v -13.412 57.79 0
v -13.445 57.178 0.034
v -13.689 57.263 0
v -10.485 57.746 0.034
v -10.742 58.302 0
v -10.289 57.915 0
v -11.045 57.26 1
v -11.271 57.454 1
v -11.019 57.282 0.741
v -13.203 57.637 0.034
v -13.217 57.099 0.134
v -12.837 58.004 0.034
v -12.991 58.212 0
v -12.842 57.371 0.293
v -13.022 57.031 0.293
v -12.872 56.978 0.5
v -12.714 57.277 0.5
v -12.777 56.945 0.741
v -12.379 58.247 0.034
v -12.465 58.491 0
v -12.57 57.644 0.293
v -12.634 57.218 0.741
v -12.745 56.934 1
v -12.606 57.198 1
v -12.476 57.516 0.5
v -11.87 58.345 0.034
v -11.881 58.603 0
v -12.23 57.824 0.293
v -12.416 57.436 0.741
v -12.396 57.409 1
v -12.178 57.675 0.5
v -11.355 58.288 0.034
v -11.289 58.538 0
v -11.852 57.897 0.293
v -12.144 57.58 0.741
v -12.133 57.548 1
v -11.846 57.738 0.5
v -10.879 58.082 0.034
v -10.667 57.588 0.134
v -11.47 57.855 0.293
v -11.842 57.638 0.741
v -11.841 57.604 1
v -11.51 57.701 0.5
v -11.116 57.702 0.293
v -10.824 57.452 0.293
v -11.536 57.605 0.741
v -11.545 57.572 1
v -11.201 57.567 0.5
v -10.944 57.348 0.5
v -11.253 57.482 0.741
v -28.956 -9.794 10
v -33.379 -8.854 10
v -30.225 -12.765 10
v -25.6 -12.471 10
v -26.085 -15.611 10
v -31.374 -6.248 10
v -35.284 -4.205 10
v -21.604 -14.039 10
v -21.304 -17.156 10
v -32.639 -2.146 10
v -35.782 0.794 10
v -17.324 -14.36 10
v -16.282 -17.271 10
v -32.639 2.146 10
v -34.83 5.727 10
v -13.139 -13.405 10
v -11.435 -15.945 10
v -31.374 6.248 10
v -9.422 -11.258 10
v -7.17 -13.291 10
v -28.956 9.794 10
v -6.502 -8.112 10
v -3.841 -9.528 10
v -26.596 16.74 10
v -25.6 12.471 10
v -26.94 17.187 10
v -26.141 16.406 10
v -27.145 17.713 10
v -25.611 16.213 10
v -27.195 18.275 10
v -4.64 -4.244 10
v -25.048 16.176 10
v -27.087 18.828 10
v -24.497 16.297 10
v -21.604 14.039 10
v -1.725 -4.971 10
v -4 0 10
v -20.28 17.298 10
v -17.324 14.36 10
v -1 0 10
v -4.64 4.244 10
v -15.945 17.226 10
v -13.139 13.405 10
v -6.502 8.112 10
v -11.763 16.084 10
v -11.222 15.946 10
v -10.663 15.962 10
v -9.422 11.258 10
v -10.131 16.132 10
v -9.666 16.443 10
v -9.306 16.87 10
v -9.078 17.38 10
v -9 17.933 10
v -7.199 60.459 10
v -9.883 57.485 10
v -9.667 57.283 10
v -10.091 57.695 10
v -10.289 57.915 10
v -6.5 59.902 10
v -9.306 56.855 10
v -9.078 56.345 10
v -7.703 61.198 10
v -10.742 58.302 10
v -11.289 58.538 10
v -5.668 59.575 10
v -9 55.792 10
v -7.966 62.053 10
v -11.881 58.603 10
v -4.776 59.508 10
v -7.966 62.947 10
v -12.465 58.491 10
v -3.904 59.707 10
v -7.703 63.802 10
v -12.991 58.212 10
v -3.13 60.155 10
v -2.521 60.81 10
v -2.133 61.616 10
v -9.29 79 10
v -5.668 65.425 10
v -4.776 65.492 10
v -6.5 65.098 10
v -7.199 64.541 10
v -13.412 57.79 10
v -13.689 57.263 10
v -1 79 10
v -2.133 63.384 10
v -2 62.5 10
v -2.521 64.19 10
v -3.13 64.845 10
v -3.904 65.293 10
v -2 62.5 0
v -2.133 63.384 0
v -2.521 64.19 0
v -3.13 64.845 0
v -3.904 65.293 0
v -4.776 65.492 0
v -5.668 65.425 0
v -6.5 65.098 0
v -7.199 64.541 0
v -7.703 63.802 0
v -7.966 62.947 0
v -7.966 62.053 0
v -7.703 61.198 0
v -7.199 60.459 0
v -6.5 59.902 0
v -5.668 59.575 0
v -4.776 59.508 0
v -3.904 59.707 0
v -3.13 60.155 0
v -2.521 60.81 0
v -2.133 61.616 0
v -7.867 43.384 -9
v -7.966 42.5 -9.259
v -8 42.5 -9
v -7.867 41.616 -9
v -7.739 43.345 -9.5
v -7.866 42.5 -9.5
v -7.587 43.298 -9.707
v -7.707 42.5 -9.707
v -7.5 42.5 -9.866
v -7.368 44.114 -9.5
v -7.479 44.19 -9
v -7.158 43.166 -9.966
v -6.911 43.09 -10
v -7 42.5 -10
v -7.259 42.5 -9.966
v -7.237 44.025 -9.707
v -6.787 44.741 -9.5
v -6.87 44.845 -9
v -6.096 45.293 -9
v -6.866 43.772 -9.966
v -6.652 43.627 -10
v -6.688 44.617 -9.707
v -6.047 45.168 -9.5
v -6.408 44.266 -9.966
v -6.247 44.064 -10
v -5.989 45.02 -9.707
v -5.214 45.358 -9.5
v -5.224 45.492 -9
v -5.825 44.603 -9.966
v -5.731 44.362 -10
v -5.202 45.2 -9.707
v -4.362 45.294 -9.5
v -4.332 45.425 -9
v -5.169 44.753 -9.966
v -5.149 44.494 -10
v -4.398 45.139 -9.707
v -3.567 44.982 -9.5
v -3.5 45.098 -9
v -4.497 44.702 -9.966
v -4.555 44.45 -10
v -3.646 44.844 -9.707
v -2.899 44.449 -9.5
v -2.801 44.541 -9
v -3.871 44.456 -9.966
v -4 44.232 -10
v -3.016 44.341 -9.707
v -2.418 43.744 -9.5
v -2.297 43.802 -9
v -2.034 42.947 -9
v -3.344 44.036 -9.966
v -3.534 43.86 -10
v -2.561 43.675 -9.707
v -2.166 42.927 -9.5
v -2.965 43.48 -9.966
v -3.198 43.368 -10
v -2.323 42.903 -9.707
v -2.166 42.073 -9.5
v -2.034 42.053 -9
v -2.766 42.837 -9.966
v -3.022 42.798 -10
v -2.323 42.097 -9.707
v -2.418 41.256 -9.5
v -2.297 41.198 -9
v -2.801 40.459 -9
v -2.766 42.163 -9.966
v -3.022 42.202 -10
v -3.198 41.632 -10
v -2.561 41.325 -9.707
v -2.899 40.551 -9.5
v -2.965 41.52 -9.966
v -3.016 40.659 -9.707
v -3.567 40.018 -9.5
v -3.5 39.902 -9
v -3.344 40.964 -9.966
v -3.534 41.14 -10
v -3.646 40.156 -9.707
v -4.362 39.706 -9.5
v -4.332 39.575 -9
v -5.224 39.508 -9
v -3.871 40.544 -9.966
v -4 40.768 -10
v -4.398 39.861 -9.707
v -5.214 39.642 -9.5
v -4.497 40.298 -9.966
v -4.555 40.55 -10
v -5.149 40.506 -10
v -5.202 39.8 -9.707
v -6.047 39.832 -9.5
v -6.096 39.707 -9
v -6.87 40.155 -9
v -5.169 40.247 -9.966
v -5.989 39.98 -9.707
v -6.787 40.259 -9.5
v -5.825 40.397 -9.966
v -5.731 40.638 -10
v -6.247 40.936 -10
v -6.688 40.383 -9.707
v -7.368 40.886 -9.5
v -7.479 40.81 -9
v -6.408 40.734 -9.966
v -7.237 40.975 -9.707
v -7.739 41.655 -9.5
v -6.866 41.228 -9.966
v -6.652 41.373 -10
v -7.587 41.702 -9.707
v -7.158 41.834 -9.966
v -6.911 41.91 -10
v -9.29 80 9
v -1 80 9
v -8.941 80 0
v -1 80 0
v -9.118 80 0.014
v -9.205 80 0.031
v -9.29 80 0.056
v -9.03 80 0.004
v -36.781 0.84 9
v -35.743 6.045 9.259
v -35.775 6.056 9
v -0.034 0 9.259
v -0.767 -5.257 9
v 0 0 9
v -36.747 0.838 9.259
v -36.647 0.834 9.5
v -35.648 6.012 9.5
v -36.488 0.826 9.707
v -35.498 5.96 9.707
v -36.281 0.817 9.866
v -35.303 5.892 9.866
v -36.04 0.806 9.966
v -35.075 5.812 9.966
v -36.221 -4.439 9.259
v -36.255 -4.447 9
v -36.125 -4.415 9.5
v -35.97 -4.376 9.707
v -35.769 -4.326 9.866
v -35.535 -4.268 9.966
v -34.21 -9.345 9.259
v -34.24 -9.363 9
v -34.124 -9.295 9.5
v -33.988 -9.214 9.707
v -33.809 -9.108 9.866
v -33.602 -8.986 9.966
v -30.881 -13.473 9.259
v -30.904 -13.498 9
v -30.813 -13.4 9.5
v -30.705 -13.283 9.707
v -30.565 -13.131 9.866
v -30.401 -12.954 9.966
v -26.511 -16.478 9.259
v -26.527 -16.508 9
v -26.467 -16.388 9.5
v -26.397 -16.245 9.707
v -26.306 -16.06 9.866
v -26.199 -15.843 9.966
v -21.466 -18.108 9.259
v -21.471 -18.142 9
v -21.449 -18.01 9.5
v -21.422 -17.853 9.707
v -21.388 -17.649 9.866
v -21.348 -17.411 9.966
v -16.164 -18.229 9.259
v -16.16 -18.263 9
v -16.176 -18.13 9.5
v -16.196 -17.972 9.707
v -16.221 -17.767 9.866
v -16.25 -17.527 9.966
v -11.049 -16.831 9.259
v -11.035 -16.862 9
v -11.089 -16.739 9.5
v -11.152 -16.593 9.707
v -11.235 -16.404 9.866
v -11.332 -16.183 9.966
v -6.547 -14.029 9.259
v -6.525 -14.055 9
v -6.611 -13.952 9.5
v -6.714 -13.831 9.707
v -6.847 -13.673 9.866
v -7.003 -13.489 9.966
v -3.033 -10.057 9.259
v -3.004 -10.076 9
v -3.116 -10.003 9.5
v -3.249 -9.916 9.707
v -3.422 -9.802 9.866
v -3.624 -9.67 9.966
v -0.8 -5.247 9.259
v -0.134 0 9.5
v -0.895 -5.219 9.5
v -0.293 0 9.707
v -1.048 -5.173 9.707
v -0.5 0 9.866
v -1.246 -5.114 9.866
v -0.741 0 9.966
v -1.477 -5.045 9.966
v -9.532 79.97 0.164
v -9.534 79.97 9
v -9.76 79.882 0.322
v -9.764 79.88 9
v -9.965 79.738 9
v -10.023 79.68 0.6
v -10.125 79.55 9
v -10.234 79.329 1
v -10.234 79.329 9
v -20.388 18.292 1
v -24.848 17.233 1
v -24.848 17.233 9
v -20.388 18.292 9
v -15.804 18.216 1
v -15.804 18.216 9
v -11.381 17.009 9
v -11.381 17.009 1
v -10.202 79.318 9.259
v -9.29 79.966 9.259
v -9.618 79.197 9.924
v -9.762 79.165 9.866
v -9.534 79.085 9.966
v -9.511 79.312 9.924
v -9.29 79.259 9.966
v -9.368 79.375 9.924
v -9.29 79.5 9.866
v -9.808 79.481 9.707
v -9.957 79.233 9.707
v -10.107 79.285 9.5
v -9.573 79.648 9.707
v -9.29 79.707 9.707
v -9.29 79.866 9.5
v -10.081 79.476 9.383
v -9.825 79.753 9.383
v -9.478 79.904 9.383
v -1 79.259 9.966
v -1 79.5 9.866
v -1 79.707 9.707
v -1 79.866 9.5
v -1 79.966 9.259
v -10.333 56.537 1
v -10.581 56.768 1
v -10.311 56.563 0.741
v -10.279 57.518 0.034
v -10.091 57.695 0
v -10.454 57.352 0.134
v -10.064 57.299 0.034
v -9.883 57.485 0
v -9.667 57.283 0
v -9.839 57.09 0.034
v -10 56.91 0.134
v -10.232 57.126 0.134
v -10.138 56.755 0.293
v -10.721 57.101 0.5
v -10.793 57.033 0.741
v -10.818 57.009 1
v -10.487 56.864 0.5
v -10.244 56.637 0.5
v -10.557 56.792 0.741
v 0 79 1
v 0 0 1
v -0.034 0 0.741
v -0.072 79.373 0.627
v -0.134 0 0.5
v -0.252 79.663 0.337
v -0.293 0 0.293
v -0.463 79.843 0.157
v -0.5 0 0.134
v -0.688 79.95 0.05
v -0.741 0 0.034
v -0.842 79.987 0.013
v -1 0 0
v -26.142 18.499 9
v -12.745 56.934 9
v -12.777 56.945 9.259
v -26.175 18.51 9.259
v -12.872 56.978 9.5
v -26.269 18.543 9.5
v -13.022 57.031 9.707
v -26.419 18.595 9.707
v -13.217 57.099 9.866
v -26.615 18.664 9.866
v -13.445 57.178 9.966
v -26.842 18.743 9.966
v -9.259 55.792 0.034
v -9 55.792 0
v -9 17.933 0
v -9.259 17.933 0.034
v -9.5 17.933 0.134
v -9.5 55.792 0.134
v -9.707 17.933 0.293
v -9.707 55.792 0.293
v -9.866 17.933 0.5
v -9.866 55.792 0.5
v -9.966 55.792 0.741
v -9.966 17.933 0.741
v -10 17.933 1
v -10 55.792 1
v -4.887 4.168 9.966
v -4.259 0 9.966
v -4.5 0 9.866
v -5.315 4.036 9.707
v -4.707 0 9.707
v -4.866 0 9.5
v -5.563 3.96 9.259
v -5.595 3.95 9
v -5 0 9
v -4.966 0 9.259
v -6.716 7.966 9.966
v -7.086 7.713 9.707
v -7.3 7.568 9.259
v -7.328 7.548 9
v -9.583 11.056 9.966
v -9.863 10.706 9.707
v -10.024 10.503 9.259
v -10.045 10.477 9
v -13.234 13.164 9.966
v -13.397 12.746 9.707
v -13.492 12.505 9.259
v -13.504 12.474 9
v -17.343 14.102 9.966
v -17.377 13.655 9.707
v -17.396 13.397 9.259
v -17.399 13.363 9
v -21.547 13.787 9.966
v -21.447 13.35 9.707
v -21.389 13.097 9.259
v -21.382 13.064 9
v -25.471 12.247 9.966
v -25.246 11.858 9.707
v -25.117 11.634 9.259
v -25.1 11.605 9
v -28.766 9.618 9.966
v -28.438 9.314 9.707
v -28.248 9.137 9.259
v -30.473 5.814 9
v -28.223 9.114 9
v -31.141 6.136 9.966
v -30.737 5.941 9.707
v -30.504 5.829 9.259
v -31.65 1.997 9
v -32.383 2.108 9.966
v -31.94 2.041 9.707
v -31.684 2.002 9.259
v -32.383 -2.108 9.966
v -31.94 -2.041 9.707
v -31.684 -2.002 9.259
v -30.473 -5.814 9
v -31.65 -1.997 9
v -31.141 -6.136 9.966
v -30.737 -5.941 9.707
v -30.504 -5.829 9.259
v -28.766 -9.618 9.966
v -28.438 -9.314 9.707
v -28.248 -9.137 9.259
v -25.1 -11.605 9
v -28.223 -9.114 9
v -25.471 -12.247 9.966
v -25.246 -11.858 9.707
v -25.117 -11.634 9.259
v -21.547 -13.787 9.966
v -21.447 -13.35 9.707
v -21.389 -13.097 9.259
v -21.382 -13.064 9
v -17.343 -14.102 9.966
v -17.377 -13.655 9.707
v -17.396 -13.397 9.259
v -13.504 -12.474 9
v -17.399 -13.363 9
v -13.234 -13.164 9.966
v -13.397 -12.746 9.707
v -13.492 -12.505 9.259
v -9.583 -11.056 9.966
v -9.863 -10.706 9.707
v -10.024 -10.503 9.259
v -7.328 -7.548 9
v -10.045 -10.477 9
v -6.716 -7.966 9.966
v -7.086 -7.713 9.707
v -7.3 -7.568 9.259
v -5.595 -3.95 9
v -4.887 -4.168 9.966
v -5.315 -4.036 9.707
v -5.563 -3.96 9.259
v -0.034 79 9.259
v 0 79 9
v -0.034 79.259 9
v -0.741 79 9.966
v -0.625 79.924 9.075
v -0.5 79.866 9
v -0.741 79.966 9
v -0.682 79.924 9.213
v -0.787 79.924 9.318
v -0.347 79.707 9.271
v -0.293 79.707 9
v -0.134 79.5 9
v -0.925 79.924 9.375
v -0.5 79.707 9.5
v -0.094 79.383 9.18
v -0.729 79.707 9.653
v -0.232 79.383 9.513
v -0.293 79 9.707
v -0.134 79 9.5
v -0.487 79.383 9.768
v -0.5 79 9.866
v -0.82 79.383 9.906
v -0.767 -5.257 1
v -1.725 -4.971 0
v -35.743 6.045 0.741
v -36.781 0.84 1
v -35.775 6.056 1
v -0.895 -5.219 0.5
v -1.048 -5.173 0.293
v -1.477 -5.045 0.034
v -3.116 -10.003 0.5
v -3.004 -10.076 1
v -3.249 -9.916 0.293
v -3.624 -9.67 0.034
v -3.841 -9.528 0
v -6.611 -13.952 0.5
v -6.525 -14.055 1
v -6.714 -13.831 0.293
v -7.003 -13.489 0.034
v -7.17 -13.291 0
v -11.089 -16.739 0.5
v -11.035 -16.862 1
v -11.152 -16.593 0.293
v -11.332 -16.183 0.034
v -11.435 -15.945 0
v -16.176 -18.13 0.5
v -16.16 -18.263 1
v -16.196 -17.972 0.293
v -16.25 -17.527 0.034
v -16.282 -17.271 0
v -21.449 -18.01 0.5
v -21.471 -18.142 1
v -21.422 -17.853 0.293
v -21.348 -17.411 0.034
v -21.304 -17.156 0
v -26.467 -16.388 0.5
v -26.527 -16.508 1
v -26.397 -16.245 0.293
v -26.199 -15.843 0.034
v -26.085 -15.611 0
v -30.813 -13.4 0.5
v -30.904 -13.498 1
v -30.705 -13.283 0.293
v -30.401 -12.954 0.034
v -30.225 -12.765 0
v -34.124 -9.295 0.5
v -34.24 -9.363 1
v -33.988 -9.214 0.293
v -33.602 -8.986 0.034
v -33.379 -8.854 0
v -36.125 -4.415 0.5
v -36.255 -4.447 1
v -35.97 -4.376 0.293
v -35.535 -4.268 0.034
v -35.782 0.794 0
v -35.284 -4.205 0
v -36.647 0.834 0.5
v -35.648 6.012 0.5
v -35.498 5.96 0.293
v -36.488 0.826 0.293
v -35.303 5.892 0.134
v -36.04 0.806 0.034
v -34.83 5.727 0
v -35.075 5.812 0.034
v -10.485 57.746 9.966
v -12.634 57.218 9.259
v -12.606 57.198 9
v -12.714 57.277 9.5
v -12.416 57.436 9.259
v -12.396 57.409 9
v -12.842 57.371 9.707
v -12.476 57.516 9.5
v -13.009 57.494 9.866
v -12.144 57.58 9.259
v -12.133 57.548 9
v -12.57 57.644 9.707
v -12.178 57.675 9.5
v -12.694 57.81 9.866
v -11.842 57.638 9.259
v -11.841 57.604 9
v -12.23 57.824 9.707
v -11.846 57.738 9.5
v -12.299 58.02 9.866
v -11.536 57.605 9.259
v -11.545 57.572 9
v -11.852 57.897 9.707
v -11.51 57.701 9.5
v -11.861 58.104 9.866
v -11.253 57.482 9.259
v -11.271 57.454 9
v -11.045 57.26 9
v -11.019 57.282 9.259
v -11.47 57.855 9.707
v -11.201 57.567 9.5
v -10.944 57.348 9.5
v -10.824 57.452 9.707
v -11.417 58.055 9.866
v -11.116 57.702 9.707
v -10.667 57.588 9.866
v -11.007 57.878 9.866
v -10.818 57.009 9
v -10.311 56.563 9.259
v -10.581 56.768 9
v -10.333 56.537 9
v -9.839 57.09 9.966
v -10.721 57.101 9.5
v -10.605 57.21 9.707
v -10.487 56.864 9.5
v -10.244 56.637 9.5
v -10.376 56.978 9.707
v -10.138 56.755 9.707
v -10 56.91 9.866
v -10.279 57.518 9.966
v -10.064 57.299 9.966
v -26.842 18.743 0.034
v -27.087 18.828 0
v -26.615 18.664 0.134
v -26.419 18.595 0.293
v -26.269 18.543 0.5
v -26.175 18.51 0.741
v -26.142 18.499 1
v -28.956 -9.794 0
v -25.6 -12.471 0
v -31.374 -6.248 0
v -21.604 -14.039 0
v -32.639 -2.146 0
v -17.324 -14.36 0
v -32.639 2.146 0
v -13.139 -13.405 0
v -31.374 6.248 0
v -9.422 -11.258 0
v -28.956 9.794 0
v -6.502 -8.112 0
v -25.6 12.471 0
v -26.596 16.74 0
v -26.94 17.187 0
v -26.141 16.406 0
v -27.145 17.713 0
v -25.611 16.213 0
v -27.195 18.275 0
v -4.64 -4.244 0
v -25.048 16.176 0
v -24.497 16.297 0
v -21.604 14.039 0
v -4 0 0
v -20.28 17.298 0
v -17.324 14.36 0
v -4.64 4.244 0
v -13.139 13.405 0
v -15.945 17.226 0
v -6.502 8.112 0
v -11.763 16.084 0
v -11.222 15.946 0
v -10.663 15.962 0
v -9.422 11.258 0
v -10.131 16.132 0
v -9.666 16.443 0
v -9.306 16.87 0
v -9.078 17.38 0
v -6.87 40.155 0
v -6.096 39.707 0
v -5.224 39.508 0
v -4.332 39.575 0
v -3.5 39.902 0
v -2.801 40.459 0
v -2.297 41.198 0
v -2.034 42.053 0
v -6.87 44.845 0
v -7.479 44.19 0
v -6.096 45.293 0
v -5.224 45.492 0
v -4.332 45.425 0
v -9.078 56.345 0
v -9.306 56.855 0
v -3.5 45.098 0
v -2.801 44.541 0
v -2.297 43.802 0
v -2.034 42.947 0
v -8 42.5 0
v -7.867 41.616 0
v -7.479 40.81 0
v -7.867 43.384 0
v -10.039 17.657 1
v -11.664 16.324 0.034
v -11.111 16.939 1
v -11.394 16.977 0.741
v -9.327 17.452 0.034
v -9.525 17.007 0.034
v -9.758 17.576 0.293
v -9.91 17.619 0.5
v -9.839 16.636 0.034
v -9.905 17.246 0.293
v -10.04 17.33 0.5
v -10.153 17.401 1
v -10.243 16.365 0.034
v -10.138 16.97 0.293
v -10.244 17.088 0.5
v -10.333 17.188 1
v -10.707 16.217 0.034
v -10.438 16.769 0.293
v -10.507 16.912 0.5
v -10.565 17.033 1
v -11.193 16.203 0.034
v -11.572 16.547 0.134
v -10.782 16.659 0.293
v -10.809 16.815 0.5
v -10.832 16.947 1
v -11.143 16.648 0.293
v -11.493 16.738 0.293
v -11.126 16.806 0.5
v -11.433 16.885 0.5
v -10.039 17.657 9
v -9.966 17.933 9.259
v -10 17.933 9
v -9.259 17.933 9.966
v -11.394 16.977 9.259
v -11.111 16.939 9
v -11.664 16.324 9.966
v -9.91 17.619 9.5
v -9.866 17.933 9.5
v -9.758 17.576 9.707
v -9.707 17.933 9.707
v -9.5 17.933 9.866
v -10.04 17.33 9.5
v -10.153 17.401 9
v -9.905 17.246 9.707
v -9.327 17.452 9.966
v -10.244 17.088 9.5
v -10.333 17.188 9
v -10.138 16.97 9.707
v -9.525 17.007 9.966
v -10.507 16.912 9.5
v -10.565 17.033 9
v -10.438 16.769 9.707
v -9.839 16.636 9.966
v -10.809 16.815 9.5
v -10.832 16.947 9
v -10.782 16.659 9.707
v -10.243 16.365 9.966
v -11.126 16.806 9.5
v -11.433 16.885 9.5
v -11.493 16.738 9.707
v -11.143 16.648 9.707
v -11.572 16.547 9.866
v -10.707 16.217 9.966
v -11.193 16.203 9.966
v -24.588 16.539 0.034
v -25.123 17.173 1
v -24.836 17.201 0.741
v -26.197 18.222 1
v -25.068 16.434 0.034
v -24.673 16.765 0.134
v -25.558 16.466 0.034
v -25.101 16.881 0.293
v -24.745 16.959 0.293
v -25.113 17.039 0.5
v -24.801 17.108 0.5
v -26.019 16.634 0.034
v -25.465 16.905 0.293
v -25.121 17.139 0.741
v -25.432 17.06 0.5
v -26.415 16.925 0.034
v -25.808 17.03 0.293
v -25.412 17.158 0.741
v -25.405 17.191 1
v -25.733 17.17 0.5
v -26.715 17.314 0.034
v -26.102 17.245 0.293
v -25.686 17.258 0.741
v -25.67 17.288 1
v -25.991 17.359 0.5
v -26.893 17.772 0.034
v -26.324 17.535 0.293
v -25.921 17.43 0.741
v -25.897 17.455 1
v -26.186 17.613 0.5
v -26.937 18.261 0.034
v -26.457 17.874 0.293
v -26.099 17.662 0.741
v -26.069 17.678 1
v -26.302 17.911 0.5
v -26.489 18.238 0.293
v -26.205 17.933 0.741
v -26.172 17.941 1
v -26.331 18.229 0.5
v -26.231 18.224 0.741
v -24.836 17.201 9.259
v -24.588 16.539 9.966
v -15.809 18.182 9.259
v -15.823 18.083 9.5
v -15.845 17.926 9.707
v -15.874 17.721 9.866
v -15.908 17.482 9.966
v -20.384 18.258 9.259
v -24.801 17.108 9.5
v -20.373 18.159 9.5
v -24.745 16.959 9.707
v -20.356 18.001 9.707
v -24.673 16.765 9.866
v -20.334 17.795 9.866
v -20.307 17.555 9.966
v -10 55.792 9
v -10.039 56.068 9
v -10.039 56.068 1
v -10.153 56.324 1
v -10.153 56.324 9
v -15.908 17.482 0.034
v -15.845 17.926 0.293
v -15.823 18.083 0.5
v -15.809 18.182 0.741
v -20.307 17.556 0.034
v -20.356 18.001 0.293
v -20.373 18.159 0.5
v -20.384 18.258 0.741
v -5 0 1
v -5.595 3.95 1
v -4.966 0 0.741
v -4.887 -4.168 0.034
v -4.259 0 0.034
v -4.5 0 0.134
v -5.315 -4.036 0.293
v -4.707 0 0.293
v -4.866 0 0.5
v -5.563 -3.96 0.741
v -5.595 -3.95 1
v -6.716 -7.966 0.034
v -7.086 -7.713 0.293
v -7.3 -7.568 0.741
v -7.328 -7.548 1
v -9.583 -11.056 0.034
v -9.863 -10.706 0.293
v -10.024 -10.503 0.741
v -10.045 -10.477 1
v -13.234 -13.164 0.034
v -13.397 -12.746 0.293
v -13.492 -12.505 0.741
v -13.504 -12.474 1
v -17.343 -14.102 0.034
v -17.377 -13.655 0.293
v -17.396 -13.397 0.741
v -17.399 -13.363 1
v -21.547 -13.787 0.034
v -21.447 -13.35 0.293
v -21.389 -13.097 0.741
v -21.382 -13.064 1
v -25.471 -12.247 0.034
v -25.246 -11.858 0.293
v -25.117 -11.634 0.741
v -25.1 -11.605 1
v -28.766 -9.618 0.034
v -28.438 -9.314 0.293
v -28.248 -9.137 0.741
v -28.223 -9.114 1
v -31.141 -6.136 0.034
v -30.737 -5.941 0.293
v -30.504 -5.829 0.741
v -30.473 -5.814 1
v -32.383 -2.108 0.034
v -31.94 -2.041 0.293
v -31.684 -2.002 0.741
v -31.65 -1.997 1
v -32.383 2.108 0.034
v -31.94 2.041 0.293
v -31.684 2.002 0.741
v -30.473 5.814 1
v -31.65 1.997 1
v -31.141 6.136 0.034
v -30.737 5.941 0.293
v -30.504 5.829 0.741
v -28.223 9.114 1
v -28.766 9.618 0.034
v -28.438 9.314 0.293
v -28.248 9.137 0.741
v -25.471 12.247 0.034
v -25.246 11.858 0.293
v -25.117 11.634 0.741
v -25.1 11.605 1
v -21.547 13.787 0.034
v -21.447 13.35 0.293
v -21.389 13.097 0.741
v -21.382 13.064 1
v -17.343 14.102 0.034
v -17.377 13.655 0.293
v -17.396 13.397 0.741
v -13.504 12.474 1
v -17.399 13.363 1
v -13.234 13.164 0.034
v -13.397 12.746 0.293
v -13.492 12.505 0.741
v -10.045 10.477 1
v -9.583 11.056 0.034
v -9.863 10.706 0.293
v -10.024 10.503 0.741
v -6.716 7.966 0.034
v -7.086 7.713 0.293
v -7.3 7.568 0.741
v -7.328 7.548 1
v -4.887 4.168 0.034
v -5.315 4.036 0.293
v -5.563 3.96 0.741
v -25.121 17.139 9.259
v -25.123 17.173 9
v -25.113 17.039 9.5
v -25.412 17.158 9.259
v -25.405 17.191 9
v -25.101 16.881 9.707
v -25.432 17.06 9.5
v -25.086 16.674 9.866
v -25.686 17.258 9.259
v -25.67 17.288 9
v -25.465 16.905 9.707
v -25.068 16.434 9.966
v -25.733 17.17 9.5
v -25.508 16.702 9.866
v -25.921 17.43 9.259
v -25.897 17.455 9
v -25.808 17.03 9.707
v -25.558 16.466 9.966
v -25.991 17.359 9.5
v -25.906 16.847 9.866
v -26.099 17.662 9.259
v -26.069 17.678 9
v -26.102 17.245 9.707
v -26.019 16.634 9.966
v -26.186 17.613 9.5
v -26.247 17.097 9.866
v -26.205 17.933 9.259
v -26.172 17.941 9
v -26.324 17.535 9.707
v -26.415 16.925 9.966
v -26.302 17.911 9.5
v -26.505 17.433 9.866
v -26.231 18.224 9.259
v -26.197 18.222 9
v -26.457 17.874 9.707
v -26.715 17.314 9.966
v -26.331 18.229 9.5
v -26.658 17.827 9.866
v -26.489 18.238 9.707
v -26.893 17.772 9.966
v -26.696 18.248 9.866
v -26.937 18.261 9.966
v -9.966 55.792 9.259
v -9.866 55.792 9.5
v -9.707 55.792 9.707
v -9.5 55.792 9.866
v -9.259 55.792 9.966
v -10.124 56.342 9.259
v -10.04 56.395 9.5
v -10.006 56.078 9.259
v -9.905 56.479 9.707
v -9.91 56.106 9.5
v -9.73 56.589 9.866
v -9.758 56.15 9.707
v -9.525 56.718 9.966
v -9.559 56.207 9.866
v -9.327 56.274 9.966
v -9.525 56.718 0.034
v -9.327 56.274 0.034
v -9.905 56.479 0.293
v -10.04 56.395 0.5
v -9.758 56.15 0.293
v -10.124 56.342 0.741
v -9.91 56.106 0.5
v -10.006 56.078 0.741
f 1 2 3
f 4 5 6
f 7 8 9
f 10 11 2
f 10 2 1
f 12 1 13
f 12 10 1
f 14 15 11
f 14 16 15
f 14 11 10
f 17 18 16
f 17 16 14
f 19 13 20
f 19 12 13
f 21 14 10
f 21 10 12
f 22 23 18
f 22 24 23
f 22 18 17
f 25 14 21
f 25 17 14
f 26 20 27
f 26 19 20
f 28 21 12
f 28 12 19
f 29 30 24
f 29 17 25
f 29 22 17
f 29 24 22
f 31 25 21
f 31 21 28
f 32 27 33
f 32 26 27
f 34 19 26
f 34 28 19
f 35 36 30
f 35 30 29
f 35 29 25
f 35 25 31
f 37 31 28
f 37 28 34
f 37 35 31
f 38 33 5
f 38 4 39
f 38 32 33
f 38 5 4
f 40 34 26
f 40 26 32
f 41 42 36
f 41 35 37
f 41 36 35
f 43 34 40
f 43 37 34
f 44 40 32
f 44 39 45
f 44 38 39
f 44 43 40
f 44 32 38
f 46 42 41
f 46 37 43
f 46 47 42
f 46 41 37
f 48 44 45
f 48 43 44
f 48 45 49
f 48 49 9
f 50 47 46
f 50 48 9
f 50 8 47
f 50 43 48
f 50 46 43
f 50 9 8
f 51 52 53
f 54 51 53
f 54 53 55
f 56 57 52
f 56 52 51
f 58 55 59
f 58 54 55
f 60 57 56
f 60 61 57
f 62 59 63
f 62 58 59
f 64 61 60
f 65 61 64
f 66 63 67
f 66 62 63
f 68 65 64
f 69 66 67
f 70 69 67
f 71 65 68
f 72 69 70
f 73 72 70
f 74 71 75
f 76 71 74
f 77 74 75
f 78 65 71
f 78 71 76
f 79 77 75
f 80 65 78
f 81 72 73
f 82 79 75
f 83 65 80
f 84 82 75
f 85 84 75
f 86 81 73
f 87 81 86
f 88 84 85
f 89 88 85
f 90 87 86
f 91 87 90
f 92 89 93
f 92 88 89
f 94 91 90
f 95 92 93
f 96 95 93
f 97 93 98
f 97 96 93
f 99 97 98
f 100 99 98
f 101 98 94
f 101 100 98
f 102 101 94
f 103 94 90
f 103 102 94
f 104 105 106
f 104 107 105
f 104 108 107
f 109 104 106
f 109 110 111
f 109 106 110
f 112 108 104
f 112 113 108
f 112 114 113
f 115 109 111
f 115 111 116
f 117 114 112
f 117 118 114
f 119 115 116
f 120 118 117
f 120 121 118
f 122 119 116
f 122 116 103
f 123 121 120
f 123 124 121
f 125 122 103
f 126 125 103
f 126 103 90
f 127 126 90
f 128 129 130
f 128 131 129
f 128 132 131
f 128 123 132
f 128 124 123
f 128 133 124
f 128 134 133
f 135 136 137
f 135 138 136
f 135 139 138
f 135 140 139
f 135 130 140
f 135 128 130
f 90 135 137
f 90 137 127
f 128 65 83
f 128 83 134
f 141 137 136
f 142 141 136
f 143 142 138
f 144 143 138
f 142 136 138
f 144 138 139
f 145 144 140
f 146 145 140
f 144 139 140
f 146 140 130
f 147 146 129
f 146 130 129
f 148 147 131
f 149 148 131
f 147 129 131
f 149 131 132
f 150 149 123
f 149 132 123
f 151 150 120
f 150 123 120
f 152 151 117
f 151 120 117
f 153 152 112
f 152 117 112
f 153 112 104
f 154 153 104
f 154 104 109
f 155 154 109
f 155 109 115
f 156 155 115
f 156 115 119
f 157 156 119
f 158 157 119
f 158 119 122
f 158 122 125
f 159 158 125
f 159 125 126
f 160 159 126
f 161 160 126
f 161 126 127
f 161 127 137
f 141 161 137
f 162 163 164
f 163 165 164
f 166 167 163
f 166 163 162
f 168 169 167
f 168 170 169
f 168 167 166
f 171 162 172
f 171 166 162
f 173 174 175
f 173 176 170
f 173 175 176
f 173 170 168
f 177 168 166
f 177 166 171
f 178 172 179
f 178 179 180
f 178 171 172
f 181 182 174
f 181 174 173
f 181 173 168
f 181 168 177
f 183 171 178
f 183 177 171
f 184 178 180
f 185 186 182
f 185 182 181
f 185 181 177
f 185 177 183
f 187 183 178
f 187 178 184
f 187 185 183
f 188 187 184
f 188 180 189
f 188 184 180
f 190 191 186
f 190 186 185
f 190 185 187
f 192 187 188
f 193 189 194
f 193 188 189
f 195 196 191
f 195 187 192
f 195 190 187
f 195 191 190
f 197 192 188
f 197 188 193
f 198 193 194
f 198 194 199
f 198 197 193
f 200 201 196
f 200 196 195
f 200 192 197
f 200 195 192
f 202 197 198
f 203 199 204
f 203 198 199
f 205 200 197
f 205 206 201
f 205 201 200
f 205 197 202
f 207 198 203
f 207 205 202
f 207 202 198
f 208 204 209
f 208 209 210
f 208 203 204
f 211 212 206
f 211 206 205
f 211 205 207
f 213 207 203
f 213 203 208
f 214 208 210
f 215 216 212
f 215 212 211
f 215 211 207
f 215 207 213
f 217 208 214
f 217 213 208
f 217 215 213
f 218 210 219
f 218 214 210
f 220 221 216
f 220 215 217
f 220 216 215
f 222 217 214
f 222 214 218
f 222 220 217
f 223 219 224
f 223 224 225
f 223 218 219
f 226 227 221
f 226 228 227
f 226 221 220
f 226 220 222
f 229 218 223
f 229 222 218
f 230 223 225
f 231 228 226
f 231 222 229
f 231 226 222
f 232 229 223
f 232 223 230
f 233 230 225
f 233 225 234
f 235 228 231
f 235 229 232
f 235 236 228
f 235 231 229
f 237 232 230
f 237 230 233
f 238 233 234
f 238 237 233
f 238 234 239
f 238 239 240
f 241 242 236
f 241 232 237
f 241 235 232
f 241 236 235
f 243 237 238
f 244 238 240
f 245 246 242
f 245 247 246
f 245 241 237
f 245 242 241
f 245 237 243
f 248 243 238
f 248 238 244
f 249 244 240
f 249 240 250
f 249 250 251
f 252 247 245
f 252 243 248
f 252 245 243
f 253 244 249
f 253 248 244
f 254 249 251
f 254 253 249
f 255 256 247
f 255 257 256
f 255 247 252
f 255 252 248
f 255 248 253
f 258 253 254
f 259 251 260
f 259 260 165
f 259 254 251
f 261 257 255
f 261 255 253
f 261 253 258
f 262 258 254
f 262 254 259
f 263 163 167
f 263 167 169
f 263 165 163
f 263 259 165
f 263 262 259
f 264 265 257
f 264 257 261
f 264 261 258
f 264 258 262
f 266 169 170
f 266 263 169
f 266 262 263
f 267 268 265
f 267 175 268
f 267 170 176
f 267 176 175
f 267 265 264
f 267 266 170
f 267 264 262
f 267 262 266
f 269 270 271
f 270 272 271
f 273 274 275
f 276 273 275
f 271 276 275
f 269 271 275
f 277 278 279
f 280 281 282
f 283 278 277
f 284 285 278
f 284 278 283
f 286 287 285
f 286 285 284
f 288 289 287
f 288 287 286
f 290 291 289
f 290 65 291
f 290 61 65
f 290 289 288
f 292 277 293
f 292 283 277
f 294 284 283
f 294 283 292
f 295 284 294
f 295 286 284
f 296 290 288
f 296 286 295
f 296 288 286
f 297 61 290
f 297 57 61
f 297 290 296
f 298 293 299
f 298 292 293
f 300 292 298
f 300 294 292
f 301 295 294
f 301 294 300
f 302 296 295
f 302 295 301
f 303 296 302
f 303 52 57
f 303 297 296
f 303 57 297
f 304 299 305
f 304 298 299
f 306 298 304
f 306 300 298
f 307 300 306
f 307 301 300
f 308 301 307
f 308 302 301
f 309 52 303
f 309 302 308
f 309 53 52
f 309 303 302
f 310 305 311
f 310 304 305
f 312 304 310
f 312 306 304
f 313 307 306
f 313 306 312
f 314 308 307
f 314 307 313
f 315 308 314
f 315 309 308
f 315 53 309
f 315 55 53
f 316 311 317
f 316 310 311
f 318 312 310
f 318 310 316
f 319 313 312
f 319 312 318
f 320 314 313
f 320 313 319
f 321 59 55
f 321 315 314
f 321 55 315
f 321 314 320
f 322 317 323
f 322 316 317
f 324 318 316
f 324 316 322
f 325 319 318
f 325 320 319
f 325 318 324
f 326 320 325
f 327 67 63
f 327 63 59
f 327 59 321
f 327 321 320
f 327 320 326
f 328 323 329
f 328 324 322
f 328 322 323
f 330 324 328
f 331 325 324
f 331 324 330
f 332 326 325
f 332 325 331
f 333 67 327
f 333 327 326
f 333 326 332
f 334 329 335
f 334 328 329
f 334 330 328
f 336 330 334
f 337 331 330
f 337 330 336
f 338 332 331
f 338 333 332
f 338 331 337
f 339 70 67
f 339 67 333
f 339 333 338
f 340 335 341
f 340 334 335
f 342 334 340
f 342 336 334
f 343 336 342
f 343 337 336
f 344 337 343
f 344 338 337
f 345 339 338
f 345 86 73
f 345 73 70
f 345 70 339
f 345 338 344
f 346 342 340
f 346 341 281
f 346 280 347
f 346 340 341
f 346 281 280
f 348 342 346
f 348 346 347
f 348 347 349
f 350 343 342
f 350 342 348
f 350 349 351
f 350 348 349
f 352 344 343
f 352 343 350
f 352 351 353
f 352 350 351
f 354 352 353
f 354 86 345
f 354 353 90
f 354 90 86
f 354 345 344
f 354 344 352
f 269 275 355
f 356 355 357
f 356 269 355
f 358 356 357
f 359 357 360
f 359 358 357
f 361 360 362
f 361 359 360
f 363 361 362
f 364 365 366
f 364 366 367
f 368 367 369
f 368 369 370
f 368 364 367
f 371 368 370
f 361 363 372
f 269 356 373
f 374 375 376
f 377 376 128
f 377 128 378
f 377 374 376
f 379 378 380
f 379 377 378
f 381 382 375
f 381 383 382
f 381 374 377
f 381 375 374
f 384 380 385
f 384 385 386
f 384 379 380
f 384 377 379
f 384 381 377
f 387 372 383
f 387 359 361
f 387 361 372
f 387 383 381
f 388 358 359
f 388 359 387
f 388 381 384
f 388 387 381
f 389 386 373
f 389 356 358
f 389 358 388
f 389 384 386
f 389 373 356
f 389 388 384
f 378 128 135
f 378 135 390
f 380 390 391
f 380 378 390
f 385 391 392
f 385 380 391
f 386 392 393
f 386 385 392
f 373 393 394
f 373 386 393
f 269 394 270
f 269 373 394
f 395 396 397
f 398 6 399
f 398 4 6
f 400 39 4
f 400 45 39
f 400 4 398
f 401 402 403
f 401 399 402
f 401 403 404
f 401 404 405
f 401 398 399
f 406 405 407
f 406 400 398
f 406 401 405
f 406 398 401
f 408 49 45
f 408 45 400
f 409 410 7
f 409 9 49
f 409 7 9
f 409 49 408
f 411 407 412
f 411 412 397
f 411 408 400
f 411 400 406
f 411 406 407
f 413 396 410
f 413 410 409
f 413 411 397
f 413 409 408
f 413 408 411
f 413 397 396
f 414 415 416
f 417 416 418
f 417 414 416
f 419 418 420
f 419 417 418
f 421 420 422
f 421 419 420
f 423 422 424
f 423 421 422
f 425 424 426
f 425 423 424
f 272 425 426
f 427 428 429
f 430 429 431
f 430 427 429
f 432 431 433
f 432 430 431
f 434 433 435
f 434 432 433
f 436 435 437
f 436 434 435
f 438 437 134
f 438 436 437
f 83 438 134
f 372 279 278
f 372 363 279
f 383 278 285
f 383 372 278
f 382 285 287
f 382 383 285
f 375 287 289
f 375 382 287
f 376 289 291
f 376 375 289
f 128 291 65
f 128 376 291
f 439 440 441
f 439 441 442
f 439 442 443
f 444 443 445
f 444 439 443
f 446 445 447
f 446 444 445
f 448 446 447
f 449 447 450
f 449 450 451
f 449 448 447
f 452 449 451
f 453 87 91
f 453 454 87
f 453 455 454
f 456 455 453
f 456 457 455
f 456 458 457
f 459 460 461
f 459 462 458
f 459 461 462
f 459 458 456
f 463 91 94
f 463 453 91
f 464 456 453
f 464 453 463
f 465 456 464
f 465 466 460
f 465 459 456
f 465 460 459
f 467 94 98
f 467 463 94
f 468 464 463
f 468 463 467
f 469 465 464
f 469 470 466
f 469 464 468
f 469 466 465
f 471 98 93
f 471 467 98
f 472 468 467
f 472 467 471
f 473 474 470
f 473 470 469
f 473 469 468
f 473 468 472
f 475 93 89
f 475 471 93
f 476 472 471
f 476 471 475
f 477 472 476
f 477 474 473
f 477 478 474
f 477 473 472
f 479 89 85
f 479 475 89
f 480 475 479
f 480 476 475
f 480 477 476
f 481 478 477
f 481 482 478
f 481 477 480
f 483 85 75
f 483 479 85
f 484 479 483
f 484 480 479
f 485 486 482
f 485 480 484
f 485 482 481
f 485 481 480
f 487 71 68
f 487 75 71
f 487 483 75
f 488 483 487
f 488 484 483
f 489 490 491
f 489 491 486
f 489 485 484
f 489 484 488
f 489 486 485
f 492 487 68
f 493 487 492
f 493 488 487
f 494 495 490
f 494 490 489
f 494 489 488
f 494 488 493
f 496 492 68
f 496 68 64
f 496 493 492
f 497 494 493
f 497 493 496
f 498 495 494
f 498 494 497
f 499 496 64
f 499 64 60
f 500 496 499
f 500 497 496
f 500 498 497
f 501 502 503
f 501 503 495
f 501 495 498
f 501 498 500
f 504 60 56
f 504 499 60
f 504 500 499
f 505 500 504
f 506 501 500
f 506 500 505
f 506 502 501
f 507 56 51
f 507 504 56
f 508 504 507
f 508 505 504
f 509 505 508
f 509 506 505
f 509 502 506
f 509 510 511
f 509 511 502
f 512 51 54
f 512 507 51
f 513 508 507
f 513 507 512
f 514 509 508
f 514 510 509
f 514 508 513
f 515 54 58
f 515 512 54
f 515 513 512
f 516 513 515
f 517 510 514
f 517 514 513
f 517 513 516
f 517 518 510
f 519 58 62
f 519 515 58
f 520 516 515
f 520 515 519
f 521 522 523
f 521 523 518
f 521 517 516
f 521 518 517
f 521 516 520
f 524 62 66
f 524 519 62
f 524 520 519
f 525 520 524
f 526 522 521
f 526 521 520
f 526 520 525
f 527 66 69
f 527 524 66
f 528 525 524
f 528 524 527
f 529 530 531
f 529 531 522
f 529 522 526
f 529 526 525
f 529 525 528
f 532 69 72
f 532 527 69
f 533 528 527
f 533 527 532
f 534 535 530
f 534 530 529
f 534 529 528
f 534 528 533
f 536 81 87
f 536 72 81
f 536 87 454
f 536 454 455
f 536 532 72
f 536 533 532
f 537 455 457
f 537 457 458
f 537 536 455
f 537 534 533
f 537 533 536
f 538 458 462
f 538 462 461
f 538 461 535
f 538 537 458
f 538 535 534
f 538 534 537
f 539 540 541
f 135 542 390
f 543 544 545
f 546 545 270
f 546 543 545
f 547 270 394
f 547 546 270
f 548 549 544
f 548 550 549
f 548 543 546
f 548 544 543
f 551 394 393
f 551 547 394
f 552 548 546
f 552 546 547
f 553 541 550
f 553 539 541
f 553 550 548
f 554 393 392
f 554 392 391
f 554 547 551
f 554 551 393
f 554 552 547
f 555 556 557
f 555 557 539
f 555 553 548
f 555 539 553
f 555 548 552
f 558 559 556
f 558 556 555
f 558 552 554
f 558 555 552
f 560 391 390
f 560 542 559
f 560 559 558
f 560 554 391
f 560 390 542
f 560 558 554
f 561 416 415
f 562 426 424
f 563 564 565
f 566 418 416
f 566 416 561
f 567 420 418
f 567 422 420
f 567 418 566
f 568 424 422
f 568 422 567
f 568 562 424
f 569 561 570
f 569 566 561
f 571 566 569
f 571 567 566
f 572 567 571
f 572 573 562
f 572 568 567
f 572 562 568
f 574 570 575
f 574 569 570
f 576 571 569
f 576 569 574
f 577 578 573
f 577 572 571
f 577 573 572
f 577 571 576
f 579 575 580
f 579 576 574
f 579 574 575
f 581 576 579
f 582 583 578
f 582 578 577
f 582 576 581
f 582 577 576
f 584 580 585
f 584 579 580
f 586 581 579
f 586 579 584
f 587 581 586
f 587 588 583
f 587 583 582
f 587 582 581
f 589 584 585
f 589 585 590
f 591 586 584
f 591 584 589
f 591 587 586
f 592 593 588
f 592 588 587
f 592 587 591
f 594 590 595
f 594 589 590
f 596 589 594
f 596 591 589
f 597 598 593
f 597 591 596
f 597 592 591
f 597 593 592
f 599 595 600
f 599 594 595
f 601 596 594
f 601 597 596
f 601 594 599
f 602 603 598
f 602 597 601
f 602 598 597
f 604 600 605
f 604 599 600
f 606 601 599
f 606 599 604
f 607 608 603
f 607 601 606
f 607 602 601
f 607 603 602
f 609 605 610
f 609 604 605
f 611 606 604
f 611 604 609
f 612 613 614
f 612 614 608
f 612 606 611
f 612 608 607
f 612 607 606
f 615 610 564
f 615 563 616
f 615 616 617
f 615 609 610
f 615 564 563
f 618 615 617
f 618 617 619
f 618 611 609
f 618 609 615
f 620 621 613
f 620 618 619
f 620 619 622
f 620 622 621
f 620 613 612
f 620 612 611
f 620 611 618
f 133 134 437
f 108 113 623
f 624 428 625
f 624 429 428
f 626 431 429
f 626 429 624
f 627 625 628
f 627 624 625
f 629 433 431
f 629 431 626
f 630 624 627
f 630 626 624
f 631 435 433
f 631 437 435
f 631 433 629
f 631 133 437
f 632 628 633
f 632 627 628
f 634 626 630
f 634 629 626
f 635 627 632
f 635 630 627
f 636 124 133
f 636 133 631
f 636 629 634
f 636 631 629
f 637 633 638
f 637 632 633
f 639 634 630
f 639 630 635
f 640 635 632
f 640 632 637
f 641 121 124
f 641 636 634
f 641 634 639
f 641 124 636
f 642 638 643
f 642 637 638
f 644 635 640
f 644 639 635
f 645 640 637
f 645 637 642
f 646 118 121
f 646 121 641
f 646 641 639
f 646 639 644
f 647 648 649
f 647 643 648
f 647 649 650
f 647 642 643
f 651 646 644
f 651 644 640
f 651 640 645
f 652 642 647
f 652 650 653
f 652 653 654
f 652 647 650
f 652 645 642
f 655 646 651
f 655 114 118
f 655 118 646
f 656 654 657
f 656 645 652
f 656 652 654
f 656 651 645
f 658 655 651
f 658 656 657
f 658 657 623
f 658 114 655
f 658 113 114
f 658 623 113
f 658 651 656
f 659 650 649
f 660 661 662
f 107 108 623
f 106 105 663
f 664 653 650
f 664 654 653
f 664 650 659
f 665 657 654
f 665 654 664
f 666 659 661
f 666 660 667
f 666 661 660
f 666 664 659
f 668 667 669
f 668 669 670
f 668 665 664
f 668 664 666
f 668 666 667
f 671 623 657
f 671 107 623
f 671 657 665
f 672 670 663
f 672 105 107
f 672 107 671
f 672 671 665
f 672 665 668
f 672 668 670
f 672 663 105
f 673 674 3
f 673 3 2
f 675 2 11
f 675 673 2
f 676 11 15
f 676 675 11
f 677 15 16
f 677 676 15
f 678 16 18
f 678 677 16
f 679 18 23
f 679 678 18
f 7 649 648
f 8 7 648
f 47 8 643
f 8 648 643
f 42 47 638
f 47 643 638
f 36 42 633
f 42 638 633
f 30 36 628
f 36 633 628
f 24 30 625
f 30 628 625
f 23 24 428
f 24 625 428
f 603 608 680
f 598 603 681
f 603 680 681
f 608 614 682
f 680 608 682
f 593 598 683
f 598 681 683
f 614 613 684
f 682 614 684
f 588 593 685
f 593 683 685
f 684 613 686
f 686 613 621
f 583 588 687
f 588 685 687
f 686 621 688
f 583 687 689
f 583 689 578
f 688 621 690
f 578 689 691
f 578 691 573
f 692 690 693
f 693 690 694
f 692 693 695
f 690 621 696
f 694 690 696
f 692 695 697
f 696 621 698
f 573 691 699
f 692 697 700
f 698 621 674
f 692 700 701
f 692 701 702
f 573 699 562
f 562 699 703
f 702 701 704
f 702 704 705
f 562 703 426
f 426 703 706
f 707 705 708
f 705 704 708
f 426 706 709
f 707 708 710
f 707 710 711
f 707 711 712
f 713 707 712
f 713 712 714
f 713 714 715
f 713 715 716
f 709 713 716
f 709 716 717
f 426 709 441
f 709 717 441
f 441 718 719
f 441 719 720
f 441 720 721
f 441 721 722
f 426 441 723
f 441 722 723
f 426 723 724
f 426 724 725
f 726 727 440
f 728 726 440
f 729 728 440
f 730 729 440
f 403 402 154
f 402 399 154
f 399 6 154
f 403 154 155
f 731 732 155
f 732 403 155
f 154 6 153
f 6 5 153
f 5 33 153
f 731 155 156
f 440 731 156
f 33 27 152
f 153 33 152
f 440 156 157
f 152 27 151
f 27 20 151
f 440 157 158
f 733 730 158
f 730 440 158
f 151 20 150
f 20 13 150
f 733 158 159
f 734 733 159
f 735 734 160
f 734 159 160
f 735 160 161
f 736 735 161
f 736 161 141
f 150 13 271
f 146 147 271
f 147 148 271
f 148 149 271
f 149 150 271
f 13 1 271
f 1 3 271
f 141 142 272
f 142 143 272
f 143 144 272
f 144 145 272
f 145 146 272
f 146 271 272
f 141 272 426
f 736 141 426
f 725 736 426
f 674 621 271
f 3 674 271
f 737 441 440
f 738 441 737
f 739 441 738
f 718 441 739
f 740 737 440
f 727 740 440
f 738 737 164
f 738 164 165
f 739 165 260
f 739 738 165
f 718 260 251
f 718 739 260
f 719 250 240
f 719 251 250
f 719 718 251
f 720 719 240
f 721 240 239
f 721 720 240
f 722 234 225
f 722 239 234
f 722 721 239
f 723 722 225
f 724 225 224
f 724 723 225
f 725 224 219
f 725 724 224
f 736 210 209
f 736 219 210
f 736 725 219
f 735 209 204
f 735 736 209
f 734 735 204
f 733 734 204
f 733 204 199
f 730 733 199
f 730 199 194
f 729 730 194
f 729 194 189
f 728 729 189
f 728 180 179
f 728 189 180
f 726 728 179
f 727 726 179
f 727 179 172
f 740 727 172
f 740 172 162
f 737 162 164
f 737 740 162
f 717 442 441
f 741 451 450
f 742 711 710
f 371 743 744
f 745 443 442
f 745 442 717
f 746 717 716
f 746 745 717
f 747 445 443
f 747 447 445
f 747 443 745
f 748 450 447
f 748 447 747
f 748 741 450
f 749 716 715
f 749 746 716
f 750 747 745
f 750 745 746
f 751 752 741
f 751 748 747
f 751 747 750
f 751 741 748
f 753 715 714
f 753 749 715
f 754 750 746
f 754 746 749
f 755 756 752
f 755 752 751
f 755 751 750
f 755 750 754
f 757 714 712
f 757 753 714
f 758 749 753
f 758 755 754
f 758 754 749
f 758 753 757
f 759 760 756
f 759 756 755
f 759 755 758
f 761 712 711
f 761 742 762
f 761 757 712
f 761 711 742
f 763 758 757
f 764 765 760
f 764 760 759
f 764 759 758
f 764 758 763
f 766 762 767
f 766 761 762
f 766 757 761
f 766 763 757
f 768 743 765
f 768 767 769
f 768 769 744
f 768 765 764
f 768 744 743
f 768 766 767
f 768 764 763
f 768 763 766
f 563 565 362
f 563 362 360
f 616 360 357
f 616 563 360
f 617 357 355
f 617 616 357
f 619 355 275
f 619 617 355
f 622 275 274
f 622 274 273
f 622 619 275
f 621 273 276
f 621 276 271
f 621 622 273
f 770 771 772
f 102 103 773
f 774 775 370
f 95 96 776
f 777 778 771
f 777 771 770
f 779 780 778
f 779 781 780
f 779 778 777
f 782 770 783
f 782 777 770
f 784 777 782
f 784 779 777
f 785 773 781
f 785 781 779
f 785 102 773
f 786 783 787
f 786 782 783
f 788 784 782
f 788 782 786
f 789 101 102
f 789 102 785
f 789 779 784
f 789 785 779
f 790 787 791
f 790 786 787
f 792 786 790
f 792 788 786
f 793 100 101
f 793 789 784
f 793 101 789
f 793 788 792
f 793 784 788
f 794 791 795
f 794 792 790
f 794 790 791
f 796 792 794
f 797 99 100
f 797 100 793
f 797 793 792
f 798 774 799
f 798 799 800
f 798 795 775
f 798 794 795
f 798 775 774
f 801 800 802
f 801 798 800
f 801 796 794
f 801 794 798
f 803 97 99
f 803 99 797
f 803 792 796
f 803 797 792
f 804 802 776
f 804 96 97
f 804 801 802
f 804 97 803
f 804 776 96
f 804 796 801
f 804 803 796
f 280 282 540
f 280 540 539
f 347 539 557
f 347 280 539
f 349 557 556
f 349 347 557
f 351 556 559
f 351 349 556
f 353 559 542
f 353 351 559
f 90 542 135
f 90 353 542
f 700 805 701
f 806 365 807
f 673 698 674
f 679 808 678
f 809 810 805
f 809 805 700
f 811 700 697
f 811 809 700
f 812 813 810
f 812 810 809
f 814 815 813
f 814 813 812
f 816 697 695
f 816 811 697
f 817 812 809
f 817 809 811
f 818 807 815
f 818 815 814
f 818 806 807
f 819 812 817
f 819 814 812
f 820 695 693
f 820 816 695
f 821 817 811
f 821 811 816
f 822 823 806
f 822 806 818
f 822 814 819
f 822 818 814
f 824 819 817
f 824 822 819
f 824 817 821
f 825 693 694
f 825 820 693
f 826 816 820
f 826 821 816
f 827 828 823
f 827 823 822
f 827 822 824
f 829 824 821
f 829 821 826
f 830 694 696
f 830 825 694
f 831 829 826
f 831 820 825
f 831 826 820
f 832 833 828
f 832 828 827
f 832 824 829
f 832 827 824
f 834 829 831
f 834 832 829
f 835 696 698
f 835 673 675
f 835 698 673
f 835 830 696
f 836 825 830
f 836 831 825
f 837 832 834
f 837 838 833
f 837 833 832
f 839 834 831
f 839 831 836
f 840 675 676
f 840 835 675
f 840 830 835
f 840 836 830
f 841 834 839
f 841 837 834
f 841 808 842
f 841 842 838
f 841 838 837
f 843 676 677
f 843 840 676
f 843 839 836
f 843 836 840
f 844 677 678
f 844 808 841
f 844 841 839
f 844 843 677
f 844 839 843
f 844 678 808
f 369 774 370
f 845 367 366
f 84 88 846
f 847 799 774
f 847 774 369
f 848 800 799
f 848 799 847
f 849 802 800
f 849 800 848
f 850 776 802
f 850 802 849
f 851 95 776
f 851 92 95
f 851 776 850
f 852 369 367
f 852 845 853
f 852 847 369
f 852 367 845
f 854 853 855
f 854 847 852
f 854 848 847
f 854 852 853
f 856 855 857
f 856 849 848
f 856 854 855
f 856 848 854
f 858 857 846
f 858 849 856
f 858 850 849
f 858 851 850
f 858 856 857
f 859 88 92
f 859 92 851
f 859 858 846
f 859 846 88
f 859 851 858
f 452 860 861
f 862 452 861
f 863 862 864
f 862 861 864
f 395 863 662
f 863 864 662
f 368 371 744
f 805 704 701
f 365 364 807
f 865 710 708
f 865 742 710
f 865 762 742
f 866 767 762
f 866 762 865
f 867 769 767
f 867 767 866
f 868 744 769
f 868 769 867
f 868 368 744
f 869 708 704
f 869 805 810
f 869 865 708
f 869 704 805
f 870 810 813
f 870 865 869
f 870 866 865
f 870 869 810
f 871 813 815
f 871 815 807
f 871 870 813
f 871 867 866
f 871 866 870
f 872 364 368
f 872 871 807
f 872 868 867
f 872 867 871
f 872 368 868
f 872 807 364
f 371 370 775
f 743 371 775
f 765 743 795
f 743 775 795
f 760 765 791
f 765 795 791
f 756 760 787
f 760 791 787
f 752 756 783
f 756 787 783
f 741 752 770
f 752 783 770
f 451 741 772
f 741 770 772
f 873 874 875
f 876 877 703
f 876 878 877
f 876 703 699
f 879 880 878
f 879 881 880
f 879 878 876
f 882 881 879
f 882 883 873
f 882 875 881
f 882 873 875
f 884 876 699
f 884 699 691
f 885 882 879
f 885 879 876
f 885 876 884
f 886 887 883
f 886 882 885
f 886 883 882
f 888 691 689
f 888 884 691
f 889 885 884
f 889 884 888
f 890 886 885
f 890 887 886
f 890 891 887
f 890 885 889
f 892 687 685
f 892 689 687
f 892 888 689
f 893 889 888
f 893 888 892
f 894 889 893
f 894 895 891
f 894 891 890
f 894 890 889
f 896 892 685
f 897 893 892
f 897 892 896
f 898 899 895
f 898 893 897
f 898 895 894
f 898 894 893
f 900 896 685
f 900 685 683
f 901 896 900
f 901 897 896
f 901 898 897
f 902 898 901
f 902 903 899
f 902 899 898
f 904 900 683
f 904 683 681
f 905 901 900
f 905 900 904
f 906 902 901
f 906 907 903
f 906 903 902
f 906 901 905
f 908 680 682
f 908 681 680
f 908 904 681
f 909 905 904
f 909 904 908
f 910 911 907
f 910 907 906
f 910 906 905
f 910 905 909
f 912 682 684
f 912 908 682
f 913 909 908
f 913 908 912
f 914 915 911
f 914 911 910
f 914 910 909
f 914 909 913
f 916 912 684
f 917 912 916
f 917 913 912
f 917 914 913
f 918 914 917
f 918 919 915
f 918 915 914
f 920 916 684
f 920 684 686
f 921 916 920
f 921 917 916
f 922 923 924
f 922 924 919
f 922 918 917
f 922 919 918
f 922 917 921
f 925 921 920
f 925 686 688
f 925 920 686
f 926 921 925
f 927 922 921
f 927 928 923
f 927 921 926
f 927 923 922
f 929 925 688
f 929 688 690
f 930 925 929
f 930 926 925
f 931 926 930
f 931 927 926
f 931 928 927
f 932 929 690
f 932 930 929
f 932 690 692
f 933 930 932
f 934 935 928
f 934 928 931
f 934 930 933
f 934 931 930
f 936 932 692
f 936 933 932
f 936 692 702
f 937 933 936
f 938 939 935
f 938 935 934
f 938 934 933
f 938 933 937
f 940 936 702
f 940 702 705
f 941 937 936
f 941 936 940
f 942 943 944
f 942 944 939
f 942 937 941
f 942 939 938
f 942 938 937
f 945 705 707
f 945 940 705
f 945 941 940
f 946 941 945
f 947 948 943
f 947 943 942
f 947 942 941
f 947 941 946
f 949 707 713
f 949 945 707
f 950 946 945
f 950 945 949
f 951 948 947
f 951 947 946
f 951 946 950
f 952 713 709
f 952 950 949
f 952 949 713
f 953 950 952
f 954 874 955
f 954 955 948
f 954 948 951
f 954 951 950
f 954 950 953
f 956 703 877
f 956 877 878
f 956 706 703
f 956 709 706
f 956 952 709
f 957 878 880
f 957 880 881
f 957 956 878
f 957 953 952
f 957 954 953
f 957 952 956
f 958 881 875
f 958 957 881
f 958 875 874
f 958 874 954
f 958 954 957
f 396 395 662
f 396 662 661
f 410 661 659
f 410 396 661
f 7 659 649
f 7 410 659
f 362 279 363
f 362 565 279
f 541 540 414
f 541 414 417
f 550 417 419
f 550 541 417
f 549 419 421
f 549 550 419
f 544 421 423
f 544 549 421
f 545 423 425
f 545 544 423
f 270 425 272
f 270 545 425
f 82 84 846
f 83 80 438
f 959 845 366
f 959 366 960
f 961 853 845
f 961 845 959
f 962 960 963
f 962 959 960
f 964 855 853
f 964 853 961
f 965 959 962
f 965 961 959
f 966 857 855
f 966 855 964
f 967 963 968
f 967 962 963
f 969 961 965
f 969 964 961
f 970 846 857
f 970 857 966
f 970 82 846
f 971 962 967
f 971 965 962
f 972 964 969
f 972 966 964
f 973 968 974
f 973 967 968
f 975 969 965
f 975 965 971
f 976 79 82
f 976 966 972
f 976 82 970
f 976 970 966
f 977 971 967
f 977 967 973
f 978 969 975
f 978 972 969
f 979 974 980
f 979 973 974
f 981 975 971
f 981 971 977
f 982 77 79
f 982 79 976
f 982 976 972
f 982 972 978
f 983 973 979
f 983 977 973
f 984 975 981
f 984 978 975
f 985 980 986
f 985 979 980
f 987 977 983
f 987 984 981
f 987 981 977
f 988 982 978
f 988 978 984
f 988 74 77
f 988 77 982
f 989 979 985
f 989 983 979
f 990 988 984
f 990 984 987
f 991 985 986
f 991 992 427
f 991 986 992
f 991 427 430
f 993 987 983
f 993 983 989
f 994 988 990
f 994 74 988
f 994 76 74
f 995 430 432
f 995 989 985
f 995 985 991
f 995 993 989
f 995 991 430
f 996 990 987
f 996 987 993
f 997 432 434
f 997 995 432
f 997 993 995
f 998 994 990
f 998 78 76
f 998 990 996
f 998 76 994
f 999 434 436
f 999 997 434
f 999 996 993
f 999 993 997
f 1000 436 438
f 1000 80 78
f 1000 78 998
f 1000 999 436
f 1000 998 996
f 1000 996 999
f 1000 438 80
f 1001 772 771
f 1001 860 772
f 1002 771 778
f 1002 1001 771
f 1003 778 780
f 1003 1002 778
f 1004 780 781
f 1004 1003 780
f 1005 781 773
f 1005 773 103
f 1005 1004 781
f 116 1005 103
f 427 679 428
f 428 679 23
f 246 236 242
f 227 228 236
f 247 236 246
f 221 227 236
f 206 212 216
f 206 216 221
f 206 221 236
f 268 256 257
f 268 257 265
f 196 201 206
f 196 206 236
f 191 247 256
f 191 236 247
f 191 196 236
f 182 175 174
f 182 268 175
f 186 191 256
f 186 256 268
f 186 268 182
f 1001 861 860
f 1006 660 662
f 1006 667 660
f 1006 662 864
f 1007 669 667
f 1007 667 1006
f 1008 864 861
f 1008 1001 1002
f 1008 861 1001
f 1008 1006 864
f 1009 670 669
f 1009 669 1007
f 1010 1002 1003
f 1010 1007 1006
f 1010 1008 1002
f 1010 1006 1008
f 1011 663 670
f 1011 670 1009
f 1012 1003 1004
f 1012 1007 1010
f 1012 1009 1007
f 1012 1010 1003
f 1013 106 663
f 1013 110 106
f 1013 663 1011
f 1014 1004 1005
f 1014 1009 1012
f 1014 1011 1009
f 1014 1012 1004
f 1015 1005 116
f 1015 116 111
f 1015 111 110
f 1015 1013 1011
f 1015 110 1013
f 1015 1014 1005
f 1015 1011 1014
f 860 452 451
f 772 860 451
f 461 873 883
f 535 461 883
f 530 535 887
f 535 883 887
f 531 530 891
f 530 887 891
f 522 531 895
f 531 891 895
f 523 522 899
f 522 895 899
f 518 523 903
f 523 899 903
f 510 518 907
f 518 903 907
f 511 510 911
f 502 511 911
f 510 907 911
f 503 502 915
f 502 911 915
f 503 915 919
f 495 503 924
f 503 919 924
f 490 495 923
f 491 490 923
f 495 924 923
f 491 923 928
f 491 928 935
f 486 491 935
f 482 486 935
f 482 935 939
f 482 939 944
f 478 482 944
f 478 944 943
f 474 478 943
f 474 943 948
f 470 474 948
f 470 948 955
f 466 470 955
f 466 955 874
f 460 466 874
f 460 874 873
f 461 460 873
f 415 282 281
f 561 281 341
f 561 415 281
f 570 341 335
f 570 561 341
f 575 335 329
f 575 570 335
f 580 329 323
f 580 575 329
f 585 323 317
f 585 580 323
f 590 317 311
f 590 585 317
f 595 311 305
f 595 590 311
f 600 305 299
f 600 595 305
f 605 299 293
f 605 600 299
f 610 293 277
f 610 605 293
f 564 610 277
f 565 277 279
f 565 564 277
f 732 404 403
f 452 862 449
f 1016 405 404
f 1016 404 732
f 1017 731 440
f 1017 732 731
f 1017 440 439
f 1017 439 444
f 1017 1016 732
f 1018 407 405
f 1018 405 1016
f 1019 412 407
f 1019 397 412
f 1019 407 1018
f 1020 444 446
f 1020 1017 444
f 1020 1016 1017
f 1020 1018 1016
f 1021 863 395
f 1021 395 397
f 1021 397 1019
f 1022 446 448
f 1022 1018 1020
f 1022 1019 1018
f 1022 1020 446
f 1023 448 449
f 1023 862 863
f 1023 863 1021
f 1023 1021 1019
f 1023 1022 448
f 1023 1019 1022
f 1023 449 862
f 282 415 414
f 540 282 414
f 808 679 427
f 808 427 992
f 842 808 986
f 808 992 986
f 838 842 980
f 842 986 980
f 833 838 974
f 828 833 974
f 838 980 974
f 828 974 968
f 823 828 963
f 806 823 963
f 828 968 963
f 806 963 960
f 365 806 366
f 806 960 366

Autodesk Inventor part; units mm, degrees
ref_plane "YZ Plane" through (0, 0, 0) normal (1, 0, 0) x (0, 1, 0)
ref_plane "XZ Plane" through (0, 0, 0) normal (0, 1, 0) x (-1, 0, 0)
ref_plane "XY Plane" through (0, 0, 0) normal (0, 0, 1) x (1, 0, 0)
sketch "Sketch1" plane through (0, 0, 0) normal (0, 0, 1) x (1, 0, 0)
  circle A0 centre (-18.4, 0) radius 13.4
  arc A1 (-35.7747, 6.0563) -> (0, 0) centre (-18.4, 0) ccw
  line L0 (-35.7747, 6.0563) -> (-10, 80)
  line L1 (0, 0) -> (0, 80)
  line L2 (0, 80) -> (-10, 80)
  line L3 (0, -41.4558) -> (0, 100.2426) projected
  line L4 (-47.5867, 0) -> (8.228, 0) projected
  dimension "d0" = 26.8
  dimension "d1" = 5
  dimension "d2" = 80
  dimension "d8" = 10
extrude "Extrusion1" add sketch "Sketch1" along normal blind 10 contours L4 A1 A0 | A0 L4 A1 L0 L2 L1
sketch "Sketch4" plane through (0, 0, 10) normal (0, 0, 1) x (1, 0, 0)
  circle A0 centre (-5, 62.5) radius 3
  circle A1 centre (-5, 42.5) radius 3
  line L0 (-5, 42.5) -> (-5, 80) construction
  line L1 (0, 80) -> (-10, 80) projected
  line L2 (0, 0) -> (0, 80) projected
  dimension "d23" = 6
  dimension "d24" = 6
  dimension "d25" = 17.5
  dimension "d26" = 20
extrude "Extrusion5" cut sketch "Sketch4" against normal up to surface (10 mm away) contours A0
sketch "Sketch5" plane through (0, 0, 0) normal (0, 0, -1) x (-1, 0, 0)
  circle A0 centre (5, 42.5) radius 3 projected
  point P0 (0, 0)
extrude "Extrusion7" add sketch "Sketch5" along normal blind 10
sketch "Sketch6" plane through (0, 0, 0) normal (0, 0, -1) x (-1, 0, 0)
  arc A0 (26.9029, 16.3175) -> (10, 16.3707) centre (18.4, 0) ccw
  line L0 (10, 36.255) -> (10, 16.3707)
  line L1 (0, 0) -> (0, 80) projected
  circle A1 centre (5, 42.5) radius 3 projected
  circle A2 centre (18.4, 0) radius 13.4 projected
  line L2 (10, 80) -> (35.7747, 6.0563) projected
  line L3 (0, 0) -> (0, 80) projected
  line L4 (10, 36.255) -> (10, 56.255)
  line L5 (26.9029, 16.3175) -> (8.2581, 69.8065)
  arc A3 (10, 56.255) -> (8.2581, 69.8065) centre (5, 62.5) ccw
  circle A4 centre (5, 62.5) radius 3 projected
  point P0 (12.094, 58.802)
  dimension "d36" = 5
  dimension "d40" = 10
  dimension "d43" = 5
  dimension "d44" = 5
extrude "Extrusion8" cut sketch "Sketch6" against normal up to surface (10 mm away) contours A0 L0 L4 A3 L5
fillet "Fillet1" radius 1 12 edges at (-21.4713, -18.1419, 10) (0, 40, 10) (-22.8874, 43.0282, 10) (-21.4713, -18.1419, 0) (0, 40, 0) (-22.8874, 43.0282, 0) (-2, 42.5, -10) (-31.8, 0, 10) (-31.8, 0, 0) (-10, 80, 5) (-5, 80, 10) (0, 80, 5)
fillet "Fillet2" radius 1 4 edges at (-12.094, 58.802, 5) (-10, 56.255, 5) (-10, 16.3707, 5) (-26.9029, 16.3175, 5)
fillet "Fillet3" radius 1 16 edges at (-10.4439, 17.1021, 10) (-18.0933, 18.3974, 10) (-25.8973, 17.4548, 10) (-19.4438, 37.7166, 10) (-11.989, 57.5872, 10) (-10.7007, 56.8873, 10) (-10.0871, 56.2, 10) (-10, 36.8625, 10) (-10.4439, 17.1021, 0) (-10, 36.8625, 0) (-10.0871, 56.2, 0) (-18.0933, 18.3974, 0) (-10.7007, 56.8873, 0) (-25.8973, 17.4548, 0) (-11.989, 57.5872, 0) (-19.4438, 37.7166, 0)
properties part number "Pedal Support R"
